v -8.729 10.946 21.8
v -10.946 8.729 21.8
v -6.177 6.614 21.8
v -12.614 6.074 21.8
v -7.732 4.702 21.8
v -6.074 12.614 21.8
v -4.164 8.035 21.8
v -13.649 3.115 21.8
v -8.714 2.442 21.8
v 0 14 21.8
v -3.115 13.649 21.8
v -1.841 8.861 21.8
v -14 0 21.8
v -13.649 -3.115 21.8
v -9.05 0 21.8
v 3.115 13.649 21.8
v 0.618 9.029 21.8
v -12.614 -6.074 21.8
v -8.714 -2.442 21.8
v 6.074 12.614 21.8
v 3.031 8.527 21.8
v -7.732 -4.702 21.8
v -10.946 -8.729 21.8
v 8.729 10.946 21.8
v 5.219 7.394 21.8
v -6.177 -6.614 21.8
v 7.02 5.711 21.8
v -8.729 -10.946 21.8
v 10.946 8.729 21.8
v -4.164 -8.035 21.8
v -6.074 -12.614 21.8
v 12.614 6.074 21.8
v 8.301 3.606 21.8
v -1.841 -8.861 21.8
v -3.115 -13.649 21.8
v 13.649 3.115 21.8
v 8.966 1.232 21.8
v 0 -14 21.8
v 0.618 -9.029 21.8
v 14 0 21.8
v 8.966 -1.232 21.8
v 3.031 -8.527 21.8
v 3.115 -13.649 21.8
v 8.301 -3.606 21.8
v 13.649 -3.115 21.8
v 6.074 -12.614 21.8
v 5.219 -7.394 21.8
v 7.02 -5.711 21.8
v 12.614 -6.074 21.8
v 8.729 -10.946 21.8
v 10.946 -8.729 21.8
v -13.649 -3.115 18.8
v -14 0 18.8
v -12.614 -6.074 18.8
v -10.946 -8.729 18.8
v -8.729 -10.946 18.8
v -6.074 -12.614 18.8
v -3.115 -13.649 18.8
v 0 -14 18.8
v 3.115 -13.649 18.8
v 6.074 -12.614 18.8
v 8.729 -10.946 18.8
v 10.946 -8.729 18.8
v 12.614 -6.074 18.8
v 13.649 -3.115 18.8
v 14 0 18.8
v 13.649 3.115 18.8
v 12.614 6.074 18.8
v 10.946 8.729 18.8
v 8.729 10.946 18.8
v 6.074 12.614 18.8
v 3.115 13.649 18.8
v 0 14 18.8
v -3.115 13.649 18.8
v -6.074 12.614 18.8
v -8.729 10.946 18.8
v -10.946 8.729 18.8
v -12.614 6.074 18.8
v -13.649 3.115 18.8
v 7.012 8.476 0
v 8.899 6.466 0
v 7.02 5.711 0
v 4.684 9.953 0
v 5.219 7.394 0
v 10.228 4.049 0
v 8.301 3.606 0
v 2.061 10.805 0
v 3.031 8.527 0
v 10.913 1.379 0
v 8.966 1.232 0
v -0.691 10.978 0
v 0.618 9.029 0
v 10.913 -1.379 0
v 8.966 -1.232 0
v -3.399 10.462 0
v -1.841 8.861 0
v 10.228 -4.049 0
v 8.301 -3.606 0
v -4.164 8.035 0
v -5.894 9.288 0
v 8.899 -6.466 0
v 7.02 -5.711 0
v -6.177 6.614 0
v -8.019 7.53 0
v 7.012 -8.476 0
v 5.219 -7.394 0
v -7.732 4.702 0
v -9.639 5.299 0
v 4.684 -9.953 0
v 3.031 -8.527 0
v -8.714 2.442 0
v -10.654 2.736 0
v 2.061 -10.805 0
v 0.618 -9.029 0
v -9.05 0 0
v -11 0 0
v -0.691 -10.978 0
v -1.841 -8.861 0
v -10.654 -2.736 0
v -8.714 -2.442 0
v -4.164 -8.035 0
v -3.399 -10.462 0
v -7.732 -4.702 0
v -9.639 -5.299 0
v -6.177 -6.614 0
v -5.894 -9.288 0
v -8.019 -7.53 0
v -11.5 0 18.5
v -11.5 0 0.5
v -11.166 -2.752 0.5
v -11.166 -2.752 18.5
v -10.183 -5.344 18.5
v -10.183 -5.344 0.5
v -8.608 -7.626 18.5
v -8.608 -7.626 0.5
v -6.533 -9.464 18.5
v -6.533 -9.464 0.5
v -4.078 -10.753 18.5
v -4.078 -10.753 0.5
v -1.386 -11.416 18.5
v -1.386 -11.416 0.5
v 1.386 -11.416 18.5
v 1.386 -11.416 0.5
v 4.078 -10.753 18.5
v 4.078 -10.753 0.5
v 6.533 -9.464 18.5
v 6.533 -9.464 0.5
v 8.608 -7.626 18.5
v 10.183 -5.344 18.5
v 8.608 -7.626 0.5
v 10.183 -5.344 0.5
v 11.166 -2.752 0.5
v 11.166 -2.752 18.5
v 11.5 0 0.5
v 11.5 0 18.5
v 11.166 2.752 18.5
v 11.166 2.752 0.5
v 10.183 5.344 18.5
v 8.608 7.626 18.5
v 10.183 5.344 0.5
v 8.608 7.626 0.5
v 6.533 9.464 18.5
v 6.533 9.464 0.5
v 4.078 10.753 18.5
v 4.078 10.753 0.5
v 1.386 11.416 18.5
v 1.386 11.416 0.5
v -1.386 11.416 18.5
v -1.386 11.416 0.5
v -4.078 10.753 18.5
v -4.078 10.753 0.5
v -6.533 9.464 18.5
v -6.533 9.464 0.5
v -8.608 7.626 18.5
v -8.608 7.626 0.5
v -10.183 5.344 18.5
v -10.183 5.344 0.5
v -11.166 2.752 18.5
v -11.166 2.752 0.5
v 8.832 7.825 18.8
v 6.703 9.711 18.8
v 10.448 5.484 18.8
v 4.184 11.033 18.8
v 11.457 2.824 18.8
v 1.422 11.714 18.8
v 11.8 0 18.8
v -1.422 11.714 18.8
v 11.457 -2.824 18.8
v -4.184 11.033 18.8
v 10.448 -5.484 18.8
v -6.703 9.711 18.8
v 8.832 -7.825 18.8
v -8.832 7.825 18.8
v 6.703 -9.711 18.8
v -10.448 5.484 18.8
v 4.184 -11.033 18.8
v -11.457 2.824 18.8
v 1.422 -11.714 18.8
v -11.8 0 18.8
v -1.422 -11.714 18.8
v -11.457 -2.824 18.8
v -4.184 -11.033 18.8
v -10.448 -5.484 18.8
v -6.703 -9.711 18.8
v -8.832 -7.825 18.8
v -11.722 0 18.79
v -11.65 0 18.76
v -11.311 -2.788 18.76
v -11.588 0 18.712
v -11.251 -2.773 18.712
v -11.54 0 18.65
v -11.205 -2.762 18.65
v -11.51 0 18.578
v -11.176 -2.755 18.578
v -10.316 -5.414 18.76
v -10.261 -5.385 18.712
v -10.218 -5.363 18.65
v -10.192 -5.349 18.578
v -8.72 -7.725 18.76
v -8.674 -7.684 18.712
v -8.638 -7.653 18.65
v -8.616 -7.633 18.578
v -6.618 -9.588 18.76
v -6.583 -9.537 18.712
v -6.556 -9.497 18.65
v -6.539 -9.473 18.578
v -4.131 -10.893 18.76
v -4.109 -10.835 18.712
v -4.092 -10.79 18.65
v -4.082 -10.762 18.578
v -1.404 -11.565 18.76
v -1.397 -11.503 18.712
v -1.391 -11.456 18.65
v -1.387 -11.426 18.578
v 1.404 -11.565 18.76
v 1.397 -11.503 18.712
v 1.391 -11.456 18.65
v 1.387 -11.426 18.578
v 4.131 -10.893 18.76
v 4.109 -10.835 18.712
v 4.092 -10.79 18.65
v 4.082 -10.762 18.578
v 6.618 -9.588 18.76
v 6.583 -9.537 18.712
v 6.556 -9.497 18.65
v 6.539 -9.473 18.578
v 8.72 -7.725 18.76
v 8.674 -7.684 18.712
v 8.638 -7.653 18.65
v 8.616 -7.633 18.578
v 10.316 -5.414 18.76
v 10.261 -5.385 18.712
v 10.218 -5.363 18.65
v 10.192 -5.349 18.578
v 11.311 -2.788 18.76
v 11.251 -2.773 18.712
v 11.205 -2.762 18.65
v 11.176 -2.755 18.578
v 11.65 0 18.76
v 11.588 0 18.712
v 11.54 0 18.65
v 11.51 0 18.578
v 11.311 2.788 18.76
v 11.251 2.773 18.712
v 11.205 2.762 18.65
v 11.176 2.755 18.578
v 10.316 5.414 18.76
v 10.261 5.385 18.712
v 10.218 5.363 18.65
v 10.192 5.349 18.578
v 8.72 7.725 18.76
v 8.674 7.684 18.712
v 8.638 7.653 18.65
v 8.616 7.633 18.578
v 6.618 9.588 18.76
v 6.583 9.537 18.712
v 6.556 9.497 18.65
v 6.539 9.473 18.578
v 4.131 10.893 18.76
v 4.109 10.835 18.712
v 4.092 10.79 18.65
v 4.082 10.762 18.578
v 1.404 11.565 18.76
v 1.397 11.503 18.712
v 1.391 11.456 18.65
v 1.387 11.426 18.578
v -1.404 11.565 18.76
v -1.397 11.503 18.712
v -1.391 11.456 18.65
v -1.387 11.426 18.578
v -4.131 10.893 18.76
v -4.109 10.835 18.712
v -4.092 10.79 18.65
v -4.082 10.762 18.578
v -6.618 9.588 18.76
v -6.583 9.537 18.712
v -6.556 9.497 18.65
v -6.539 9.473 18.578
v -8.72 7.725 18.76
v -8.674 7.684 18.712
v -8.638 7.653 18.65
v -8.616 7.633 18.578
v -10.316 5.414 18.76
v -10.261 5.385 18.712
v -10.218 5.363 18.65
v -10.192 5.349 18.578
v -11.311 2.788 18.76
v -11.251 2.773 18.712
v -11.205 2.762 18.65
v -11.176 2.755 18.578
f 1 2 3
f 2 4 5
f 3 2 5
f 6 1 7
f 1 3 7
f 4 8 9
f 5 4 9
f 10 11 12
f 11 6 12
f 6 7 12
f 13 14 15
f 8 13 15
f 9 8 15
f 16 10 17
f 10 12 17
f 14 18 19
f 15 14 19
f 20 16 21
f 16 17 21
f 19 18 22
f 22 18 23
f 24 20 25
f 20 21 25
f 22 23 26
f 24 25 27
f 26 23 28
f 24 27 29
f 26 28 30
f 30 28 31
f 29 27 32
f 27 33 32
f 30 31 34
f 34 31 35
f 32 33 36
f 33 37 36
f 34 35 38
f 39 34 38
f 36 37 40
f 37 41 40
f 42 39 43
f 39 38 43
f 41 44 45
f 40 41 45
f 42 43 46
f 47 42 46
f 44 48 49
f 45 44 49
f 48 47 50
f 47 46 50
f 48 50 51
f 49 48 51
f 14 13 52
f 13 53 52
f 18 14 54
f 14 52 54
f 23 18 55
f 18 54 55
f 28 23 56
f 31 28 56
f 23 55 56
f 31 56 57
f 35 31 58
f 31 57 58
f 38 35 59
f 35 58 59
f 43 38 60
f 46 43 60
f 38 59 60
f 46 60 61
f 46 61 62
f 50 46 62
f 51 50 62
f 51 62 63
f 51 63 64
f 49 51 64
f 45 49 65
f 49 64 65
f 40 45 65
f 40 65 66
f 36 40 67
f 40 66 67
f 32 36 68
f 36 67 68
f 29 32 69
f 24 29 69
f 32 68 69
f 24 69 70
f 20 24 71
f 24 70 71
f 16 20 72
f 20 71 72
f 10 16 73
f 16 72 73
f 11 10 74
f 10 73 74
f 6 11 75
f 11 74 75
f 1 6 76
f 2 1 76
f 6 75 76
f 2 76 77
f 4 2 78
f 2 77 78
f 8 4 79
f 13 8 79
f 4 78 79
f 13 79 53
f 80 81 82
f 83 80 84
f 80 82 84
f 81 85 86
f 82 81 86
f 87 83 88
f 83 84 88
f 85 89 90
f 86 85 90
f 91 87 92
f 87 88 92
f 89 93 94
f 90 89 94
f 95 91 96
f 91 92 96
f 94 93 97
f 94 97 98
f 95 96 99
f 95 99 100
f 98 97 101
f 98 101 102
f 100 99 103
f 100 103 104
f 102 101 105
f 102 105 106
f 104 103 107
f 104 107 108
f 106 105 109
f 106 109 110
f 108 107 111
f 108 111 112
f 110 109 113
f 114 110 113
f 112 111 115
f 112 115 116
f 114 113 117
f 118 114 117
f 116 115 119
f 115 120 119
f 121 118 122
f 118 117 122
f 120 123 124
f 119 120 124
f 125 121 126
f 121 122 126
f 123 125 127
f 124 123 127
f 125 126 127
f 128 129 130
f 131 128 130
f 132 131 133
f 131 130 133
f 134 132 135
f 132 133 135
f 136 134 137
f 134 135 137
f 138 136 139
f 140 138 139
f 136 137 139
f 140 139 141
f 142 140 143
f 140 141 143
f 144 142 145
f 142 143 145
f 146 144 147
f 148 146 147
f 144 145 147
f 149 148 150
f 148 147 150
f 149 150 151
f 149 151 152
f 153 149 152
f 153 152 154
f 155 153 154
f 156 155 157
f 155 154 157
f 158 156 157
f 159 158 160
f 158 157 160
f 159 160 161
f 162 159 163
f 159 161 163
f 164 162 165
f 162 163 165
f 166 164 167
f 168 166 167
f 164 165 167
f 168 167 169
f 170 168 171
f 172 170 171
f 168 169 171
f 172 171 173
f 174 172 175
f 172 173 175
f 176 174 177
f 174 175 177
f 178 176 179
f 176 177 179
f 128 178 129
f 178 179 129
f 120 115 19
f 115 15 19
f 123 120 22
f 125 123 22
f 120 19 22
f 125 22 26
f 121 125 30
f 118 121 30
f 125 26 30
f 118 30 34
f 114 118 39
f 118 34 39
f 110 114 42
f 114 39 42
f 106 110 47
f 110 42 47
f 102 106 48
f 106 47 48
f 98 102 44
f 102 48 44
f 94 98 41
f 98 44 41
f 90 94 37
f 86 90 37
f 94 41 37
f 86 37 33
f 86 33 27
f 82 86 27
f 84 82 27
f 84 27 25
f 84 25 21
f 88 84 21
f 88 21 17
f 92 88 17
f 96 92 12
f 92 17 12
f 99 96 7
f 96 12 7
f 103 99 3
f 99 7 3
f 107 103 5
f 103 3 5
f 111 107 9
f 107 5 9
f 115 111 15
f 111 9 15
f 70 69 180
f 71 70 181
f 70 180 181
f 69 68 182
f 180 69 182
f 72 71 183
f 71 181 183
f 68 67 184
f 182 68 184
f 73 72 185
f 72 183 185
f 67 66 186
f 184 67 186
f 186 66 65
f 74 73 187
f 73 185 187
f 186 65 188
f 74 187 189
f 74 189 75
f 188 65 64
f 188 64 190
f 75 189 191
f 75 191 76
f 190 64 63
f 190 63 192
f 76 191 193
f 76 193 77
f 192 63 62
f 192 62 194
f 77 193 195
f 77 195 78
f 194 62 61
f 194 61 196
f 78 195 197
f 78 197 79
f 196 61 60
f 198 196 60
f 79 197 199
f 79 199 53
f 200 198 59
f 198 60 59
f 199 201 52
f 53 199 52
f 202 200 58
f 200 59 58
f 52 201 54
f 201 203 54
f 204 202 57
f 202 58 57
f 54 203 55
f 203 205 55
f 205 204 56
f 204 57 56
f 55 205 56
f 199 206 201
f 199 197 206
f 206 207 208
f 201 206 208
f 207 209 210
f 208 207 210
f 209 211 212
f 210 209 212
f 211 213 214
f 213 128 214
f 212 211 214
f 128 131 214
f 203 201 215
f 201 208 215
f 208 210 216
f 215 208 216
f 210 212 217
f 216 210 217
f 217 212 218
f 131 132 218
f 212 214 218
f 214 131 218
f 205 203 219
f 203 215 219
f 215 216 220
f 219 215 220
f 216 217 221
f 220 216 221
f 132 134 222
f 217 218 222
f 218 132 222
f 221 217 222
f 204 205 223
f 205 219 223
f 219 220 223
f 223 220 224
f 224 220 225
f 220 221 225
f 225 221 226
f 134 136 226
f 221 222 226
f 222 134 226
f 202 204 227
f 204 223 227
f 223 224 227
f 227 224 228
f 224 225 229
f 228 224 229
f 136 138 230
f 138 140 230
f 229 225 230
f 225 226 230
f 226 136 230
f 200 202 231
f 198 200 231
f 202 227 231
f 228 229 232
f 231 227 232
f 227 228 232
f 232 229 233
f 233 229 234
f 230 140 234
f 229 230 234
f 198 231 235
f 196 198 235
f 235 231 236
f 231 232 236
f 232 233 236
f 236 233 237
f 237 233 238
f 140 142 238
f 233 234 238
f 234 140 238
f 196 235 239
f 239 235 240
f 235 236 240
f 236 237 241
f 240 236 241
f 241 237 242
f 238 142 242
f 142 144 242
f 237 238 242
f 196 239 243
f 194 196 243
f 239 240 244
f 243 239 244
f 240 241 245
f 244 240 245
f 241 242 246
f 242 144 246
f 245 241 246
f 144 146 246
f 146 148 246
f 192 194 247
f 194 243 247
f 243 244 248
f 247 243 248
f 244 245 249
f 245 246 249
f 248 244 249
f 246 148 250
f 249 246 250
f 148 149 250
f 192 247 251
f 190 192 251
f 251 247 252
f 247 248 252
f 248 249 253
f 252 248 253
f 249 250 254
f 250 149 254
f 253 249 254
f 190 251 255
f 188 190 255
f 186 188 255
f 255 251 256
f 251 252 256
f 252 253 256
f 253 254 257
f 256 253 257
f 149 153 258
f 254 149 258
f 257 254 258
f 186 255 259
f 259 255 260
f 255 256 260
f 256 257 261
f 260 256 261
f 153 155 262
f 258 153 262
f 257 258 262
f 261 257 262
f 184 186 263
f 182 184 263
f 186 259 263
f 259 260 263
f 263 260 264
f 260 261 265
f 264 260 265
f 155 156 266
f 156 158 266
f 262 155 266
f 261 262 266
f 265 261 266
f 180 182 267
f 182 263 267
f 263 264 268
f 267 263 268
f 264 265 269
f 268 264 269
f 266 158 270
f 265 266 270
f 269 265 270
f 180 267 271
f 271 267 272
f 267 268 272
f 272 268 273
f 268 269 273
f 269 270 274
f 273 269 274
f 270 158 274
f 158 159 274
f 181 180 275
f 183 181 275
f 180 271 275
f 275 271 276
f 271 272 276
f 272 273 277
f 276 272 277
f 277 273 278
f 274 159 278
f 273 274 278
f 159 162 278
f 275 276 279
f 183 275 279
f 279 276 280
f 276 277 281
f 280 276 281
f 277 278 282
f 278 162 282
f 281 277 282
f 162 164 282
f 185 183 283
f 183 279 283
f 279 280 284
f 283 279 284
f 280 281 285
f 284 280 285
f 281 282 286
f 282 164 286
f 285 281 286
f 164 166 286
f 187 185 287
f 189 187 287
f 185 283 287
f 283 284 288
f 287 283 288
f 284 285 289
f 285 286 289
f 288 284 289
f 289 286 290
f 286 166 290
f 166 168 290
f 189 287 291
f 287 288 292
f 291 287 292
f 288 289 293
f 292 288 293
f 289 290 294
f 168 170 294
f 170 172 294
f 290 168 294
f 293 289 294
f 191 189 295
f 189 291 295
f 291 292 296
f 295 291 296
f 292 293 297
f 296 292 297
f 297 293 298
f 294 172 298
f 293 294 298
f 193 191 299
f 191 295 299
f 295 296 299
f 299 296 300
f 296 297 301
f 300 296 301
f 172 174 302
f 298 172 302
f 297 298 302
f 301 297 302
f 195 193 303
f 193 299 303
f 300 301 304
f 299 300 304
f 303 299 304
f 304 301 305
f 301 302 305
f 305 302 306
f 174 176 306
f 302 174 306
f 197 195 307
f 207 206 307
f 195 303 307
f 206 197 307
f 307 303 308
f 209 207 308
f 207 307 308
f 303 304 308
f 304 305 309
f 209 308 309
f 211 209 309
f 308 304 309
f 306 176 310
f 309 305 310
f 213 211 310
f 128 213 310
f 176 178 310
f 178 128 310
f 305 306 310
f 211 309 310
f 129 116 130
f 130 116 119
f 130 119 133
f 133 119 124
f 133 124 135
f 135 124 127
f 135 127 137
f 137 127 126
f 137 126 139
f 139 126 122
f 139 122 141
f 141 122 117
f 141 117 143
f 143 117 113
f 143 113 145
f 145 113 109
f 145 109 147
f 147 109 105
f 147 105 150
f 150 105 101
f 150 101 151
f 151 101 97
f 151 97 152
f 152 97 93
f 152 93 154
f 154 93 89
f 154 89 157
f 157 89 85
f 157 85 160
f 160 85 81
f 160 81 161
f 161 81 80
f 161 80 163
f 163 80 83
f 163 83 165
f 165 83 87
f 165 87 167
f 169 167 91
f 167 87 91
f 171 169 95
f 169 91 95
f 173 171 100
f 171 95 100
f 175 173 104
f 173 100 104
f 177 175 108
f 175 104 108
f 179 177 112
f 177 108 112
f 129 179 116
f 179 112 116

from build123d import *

# Parameters (mm, degrees)
F4_R    = 0.3
F5_SIZE = 0.5


with BuildPart() as f3:
    # F2 (on Front) → F3 (revolve)
    with BuildSketch(Plane.XZ):
        Polygon((-9.05, 21.8), (-14, 21.8), (-14, 18.8), (-11.5, 18.8), (-11.5, 0), (-9.05, 0), align=None)
    revolve(axis=Axis((0, 0, 10.9), (0, 0, 1)))

    # F4
    f4_edges = [f3.edges().sort_by_distance(p)[0] for p in [
        (11.5, 0, 18.8),
    ]]
    fillet(f4_edges, radius=F4_R)

    # F5
    f5_edges = [f3.edges().sort_by_distance(p)[0] for p in [
        (11.5, 0, 0),
    ]]
    chamfer(f5_edges, length=F5_SIZE)


solid = f3.part
